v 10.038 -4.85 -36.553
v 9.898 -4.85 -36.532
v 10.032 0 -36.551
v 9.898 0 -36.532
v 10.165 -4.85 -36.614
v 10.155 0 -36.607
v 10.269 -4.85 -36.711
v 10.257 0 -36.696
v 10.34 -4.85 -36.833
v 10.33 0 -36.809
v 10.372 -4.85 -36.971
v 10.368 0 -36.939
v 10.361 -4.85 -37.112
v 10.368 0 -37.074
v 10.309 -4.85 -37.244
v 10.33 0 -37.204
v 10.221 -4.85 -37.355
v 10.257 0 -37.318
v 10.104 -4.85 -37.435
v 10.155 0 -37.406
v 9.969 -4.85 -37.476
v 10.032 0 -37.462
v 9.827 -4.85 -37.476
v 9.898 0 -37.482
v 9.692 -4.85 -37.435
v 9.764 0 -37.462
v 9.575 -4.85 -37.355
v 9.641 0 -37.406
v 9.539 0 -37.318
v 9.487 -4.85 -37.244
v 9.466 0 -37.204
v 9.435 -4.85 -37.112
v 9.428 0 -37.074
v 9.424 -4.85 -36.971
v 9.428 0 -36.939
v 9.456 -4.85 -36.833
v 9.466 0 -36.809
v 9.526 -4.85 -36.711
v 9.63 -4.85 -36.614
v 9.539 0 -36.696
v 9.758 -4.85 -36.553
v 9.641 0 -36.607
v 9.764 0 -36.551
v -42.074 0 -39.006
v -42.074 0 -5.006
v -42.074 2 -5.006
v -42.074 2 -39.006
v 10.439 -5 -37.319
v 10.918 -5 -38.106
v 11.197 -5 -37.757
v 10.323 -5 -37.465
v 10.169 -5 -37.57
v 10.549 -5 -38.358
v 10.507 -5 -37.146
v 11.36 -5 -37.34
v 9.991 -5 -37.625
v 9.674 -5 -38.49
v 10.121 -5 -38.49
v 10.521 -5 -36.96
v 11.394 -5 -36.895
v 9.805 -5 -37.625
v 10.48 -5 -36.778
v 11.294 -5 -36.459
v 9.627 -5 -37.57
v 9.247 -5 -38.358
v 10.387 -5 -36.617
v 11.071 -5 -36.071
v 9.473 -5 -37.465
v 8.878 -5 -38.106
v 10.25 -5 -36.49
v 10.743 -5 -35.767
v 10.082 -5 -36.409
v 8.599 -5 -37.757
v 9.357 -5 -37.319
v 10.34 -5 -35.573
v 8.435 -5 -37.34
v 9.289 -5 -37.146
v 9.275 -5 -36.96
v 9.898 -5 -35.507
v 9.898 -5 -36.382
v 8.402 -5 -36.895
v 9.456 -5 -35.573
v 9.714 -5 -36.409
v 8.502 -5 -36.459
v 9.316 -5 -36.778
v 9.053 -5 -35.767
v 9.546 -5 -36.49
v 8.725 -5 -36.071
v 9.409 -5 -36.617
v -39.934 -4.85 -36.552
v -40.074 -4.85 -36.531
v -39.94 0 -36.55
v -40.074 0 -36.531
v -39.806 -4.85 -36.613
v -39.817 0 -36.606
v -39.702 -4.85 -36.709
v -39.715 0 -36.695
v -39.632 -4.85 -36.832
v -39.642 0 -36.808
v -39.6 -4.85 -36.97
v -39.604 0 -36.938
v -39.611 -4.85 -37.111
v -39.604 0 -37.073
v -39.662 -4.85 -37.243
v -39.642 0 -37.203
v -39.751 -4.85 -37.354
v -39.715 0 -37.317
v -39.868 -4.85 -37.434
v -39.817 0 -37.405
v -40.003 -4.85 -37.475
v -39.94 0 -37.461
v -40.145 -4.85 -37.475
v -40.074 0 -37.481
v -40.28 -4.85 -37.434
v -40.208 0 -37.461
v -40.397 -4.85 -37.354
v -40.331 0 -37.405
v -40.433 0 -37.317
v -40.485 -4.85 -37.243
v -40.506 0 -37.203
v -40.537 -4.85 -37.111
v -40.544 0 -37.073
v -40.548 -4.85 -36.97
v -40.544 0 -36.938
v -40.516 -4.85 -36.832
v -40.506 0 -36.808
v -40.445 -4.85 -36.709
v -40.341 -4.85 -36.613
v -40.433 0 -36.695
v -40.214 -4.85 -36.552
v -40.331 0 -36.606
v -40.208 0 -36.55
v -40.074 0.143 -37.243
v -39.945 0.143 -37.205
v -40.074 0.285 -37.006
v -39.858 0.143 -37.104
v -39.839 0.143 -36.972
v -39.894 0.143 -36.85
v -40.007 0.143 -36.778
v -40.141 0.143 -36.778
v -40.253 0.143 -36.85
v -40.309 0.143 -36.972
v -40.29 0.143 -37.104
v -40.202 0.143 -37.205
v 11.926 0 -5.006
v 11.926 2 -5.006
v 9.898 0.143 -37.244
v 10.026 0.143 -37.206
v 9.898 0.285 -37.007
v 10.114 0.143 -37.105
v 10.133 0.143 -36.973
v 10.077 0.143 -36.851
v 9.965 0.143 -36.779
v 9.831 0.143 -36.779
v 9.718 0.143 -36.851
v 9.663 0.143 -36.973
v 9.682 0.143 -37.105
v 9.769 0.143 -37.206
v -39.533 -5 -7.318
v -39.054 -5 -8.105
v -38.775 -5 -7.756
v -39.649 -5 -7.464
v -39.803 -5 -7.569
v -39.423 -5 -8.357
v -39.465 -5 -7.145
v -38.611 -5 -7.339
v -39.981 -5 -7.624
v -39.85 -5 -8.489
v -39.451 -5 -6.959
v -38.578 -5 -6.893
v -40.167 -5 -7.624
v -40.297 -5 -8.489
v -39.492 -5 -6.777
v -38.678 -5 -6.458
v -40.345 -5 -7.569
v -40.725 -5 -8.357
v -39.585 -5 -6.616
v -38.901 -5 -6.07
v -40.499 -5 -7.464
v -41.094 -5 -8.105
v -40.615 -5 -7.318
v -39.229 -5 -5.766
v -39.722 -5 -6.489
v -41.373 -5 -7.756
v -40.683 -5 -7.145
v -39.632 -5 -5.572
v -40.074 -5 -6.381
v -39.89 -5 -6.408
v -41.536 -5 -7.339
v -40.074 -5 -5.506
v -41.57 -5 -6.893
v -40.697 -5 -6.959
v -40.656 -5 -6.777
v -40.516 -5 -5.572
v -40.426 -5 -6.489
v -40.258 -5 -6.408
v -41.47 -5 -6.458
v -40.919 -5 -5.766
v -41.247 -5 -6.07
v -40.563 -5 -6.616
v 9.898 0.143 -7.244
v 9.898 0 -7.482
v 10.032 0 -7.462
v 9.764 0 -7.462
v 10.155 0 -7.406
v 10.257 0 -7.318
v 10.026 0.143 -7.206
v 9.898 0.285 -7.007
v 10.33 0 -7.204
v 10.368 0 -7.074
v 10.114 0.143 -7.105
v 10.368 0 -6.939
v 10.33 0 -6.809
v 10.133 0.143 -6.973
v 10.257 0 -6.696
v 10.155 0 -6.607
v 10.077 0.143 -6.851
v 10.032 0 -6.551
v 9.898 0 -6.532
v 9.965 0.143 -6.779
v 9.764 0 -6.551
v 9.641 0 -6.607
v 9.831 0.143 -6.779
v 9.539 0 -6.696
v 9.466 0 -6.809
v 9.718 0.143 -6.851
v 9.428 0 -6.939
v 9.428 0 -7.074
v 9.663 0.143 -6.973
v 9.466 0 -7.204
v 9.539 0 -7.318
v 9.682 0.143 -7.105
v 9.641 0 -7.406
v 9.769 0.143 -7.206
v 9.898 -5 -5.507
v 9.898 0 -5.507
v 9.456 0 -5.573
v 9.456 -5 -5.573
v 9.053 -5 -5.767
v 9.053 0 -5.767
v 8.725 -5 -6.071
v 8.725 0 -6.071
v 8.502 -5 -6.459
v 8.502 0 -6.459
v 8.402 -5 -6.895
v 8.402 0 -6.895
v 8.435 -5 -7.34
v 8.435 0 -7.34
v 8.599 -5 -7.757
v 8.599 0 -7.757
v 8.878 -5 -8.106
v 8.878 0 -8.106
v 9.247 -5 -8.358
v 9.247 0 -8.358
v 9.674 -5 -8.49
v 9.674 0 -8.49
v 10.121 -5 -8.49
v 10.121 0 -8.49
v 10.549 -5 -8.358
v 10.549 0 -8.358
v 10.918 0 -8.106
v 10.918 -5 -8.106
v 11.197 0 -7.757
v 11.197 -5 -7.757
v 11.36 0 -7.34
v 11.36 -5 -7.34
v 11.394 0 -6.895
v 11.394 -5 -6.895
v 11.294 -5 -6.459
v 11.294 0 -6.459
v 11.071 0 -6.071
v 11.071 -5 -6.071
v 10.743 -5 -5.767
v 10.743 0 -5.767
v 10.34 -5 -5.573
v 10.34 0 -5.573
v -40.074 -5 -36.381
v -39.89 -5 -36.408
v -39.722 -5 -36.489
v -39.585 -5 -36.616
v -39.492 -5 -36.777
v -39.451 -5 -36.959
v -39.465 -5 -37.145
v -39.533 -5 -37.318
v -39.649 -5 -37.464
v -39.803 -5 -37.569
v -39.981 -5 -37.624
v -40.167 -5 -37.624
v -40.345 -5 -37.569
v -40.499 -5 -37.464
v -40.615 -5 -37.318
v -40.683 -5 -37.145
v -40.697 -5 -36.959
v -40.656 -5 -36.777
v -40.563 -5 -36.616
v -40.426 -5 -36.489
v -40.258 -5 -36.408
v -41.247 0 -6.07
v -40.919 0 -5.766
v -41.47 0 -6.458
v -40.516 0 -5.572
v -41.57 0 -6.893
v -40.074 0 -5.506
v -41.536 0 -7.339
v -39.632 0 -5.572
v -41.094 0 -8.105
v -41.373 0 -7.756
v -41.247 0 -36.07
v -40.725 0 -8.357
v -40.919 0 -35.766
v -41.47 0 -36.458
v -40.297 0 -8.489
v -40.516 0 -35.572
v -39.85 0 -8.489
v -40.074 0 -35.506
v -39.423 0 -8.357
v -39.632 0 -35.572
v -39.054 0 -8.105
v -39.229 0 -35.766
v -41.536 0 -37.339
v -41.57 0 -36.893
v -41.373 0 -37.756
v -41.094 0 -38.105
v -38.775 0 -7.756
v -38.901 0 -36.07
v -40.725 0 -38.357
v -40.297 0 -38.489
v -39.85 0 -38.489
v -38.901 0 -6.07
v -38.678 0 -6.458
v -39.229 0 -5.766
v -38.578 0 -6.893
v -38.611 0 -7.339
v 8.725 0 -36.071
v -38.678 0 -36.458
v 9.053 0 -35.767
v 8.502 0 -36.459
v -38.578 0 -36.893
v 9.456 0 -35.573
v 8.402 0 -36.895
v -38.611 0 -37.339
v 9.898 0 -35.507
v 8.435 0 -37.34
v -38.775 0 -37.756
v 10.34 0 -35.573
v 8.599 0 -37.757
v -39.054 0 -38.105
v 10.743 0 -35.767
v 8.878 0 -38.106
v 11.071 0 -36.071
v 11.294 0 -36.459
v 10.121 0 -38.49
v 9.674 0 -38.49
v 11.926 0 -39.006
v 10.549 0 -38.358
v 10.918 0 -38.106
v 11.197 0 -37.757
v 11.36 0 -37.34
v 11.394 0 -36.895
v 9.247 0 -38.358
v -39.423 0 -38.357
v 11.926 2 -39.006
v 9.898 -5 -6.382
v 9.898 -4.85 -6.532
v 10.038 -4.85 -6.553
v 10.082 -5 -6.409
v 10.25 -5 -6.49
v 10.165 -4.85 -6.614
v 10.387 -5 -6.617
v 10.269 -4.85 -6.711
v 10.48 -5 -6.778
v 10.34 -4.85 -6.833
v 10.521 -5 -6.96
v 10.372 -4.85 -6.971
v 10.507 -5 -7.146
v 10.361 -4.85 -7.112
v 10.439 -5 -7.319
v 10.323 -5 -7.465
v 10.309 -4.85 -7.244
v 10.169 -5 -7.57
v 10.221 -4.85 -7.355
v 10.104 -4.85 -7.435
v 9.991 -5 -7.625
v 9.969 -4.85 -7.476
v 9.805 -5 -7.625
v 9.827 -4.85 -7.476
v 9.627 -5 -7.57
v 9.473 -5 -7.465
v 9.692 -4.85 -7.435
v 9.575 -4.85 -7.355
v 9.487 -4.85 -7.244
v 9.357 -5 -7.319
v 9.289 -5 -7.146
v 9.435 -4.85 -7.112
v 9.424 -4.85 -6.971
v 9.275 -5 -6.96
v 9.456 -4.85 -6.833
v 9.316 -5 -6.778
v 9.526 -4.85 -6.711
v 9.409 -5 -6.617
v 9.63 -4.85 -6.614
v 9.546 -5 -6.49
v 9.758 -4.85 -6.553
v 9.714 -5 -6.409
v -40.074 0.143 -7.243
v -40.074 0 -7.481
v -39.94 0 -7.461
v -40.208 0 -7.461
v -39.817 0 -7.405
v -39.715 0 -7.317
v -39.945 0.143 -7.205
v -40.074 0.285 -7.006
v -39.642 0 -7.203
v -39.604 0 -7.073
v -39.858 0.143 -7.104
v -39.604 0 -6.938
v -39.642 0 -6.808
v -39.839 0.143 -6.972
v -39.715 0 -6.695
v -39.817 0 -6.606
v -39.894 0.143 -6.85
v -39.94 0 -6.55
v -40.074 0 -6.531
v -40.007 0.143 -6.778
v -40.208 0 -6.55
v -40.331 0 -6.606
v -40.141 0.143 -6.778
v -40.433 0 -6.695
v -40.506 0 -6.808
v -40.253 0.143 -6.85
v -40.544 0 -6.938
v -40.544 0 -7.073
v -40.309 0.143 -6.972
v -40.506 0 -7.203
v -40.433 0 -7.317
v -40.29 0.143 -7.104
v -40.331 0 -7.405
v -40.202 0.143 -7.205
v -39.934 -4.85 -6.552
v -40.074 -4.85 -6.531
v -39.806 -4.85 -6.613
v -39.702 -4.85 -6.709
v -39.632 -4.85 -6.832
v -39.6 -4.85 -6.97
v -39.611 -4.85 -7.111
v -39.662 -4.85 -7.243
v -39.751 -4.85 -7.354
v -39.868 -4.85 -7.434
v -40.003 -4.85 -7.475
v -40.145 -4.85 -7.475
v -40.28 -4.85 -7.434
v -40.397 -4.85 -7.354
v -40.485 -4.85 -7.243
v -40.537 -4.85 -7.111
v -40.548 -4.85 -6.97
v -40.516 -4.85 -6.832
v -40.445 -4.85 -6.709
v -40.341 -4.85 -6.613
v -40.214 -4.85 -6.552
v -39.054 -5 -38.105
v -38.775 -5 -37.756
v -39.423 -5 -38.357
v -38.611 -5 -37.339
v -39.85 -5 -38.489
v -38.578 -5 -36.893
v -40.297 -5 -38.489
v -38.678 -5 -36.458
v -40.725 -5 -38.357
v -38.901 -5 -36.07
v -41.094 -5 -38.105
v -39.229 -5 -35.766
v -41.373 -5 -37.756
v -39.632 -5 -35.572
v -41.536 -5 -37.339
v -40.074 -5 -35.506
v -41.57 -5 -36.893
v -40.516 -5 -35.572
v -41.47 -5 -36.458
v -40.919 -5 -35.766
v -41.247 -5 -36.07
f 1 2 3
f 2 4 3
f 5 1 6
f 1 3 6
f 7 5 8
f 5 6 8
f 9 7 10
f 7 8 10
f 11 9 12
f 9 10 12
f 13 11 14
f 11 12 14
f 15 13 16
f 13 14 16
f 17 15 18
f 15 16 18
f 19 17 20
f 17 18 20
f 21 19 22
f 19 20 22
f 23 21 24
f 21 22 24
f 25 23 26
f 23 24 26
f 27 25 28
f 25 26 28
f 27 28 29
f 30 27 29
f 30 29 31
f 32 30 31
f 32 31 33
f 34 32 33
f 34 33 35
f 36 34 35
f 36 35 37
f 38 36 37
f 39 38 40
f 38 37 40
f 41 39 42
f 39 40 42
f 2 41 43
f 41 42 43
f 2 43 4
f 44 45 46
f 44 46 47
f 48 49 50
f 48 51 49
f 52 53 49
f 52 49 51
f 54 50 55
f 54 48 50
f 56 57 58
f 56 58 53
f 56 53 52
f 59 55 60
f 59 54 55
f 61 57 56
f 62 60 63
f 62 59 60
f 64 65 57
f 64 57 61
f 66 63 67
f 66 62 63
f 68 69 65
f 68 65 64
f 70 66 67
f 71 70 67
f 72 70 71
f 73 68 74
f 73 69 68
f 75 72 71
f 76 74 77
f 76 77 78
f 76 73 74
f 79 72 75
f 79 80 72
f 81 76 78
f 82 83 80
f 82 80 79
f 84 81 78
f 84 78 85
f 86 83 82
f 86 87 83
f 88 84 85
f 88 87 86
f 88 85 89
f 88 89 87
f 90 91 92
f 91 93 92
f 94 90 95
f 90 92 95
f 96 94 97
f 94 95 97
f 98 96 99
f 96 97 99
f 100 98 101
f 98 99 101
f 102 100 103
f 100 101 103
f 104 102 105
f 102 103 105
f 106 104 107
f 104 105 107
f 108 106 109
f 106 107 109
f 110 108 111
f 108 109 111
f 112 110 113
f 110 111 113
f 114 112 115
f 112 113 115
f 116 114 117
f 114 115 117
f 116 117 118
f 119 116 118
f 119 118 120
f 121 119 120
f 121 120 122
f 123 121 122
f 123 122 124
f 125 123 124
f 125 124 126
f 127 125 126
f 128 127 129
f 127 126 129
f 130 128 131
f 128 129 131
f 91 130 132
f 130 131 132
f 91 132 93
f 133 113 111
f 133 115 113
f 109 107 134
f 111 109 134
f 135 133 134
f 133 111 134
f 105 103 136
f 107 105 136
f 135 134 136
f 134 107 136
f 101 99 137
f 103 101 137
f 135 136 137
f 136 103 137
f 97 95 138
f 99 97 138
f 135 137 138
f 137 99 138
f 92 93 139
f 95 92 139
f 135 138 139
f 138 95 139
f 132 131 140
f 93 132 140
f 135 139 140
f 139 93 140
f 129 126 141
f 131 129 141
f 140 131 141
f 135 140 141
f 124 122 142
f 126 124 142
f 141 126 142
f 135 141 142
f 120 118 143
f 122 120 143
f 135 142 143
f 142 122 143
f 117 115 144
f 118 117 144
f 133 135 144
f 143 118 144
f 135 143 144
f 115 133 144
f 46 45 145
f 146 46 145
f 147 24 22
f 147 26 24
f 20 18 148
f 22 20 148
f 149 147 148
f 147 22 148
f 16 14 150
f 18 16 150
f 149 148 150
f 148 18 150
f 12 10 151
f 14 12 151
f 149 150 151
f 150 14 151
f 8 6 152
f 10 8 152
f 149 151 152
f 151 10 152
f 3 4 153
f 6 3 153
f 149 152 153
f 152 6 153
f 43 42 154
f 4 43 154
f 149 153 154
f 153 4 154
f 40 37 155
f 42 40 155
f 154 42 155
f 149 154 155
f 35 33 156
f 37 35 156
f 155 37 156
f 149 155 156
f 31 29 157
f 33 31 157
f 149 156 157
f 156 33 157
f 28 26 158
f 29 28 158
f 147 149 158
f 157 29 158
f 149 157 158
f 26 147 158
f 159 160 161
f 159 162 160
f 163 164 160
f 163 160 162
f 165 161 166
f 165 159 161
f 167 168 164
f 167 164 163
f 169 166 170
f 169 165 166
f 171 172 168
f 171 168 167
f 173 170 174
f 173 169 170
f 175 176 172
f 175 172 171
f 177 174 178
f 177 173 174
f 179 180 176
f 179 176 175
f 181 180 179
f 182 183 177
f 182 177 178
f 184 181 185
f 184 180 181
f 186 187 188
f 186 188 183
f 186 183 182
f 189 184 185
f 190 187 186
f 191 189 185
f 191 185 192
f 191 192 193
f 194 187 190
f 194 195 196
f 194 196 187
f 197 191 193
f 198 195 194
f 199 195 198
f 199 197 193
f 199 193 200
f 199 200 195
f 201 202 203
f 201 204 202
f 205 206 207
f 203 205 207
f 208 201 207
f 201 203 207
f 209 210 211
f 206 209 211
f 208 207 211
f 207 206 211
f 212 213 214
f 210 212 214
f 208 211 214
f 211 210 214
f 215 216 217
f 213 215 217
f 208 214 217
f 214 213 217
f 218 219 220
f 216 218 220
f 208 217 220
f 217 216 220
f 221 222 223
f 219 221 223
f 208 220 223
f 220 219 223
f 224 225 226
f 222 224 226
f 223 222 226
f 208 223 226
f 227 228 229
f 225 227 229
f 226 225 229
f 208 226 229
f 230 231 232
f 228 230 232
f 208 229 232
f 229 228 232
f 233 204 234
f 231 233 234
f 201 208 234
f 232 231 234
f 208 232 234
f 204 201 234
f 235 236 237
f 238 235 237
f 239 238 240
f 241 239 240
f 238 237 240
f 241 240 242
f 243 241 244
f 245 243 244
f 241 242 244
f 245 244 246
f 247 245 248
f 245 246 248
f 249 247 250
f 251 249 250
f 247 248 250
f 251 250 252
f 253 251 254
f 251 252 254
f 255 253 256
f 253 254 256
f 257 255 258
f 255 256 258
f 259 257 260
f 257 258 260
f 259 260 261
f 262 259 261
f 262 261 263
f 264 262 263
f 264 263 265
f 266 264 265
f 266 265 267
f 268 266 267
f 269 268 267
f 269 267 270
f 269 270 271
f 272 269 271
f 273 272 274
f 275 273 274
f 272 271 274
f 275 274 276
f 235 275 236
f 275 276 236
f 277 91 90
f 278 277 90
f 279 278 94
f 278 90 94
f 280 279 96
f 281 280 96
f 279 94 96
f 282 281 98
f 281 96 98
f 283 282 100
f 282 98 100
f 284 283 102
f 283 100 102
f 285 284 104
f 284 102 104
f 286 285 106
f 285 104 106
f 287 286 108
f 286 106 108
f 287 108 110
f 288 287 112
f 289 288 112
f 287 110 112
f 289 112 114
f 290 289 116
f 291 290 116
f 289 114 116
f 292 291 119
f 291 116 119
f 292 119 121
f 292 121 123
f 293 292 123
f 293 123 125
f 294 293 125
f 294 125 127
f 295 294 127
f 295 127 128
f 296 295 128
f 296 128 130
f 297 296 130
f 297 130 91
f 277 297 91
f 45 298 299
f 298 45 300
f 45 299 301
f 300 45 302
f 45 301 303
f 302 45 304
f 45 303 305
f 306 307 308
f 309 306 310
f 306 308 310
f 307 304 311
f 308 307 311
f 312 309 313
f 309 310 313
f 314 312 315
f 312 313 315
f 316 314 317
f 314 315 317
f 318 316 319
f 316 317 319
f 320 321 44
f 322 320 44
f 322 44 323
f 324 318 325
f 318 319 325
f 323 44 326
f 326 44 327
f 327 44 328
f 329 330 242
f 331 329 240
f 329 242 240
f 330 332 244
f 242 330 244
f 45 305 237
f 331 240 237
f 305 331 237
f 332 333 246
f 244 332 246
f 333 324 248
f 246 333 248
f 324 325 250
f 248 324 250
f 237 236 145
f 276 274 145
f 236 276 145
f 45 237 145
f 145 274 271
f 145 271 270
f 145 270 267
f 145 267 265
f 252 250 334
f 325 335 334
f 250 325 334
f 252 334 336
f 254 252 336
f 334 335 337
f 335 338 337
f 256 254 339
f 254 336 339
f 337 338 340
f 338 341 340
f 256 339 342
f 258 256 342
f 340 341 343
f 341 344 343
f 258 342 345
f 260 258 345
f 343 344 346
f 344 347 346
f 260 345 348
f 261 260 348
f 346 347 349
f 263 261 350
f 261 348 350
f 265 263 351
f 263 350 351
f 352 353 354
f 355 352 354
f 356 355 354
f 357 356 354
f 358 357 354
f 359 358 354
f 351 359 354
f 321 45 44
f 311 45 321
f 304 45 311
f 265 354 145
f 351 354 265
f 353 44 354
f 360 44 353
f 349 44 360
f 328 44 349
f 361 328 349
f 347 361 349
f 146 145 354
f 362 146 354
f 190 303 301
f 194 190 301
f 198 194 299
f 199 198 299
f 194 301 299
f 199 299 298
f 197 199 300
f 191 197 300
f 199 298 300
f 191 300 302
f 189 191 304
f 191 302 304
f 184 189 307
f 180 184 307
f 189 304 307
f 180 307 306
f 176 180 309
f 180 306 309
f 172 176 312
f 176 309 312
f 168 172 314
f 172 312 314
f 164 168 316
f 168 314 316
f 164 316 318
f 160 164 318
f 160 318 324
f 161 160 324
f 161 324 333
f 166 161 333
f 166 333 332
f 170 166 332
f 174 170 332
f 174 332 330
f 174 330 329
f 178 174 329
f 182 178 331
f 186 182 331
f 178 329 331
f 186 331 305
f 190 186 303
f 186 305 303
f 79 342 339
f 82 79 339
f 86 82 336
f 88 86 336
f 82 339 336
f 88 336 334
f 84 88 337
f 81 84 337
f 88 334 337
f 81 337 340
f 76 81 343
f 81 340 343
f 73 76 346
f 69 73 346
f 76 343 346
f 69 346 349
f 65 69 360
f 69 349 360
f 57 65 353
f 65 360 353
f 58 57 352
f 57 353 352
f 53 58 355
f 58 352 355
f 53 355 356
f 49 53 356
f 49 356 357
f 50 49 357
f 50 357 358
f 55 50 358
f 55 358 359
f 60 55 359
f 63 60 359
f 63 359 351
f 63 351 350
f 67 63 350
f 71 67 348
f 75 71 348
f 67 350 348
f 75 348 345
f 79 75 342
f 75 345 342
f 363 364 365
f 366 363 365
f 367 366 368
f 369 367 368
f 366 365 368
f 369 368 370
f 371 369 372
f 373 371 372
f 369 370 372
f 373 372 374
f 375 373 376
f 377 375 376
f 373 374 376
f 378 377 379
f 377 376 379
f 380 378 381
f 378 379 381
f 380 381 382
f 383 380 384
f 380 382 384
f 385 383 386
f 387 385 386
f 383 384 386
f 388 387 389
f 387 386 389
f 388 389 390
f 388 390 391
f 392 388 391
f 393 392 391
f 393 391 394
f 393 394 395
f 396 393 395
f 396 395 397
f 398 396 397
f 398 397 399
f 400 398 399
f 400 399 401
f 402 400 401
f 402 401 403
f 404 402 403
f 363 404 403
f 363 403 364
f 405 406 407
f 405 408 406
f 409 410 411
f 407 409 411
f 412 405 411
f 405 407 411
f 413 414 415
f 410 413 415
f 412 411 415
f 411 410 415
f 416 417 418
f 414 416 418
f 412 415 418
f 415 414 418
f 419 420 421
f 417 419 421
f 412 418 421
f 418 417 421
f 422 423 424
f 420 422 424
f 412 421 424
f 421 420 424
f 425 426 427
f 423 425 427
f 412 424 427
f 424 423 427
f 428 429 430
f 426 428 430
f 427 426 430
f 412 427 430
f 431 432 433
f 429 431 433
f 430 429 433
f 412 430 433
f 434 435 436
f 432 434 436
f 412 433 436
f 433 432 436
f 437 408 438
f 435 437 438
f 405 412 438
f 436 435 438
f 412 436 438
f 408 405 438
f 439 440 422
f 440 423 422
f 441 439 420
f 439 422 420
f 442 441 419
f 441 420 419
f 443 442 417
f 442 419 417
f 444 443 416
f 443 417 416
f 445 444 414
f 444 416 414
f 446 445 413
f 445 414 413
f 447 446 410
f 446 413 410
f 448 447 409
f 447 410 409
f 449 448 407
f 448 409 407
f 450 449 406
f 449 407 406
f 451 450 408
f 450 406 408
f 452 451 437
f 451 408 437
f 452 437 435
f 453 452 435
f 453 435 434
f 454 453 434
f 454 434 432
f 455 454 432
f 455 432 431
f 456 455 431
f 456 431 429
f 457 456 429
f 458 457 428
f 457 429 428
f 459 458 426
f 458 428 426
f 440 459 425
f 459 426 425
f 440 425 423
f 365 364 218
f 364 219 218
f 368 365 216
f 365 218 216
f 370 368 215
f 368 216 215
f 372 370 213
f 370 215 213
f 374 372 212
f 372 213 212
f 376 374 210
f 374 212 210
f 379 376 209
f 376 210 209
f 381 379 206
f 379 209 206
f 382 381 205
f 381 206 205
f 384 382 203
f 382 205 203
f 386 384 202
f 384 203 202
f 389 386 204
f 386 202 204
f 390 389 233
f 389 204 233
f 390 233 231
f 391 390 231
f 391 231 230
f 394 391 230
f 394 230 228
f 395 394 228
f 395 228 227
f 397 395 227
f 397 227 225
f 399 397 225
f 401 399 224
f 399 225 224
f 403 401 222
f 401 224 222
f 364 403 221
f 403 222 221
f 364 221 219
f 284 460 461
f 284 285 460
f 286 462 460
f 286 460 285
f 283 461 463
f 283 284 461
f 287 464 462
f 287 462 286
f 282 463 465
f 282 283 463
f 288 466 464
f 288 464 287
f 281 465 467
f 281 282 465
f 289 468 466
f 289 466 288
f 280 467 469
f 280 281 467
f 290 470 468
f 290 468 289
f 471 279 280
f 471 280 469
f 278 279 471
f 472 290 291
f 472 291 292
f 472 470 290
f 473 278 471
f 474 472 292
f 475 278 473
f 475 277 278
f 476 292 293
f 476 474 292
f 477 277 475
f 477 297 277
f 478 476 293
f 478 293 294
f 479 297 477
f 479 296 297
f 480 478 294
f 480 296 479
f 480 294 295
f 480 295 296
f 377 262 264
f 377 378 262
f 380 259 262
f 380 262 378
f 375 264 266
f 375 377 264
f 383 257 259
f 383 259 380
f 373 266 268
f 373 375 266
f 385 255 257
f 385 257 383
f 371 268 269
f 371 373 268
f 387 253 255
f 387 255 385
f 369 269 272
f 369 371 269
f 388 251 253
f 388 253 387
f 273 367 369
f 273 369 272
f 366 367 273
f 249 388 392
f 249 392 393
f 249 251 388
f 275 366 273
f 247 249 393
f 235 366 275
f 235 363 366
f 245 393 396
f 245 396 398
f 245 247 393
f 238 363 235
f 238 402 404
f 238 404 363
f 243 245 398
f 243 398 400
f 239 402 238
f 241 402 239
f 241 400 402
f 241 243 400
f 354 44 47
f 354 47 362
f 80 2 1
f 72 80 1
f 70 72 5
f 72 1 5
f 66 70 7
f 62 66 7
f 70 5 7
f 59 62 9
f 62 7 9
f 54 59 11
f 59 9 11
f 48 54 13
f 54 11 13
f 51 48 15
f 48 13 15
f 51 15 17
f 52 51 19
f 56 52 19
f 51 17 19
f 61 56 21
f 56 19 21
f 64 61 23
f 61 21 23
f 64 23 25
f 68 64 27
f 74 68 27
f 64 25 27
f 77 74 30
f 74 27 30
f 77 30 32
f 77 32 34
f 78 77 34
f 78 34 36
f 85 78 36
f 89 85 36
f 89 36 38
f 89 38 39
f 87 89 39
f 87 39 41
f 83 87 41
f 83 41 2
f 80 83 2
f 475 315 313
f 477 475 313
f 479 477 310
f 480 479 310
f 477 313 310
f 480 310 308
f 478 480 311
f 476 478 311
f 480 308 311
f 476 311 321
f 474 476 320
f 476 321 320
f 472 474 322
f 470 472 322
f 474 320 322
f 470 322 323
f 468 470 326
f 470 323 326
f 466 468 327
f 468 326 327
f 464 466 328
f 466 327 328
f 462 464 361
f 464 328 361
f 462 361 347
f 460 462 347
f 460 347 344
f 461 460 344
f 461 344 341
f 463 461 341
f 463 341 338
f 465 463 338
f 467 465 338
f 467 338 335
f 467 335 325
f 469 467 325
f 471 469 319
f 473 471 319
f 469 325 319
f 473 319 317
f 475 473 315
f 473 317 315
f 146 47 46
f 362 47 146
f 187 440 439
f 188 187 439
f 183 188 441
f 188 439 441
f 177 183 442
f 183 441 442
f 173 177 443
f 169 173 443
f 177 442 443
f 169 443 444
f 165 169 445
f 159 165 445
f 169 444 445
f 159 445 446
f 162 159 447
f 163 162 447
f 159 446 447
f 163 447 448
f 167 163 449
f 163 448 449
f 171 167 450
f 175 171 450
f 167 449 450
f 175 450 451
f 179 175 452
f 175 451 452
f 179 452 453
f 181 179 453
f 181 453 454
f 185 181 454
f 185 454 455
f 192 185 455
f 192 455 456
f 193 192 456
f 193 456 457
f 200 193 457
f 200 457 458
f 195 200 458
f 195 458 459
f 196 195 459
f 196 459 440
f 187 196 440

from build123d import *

# Parameters (mm, degrees)
SKETCH1_W                          = 54
SKETCH1_H                          = 34
BOSS_EXTRUDE1_DEPTH                = 2
SKETCH4_R                          = 1.5
BOSS_EXTRUDE2_DEPTH                = 5
M1_2X0_25_TAPPED_HOLE1_D           = 0.95
M1_2X0_25_TAPPED_HOLE1_DEPTH       = 5
M1_2X0_25_TAPPED_HOLE1_CSINK_D     = 1.25
M1_2X0_25_TAPPED_HOLE1_CSINK_ANGLE = 90
M1_2X0_25_TAPPED_HOLE1_TIP         = 0.285408794


with BuildPart() as part:
    # Sketch1 → Boss-Extrude1 (new body)
    with BuildSketch(Plane(origin=(0, 0, 0), x_dir=(1, 0, 0), z_dir=(0, 1, 0))):
        with Locations((-15.073860766, 22.005565176)):
            Rectangle(SKETCH1_W, SKETCH1_H)
    extrude(amount=BOSS_EXTRUDE1_DEPTH)

    # Sketch4 → Boss-Extrude2 (add)
    with BuildSketch(Plane.XZ):
        with Locations(Location((-40.073860766, -7.005565176, 0), (0, 0, 90))):
            Circle(SKETCH4_R)
        with Locations(Location((9.897863343, -7.006700775, 0), (0, 0, 90))):
            Circle(SKETCH4_R)
        with Locations(Location((9.897863343, -37.006700775, 0), (0, 0, 90))):
            Circle(SKETCH4_R)
        with Locations(Location((-40.073860766, -37.005565176, 0), (0, 0, 90))):
            Circle(SKETCH4_R)
    extrude(amount=BOSS_EXTRUDE2_DEPTH)

    # M1.2x0.25 Tapped Hole1
    with Locations(Plane(origin=(-40.073860766, -5, -7.005565176), x_dir=(0, 0, -1), z_dir=(0, -1, 0))):
        with Locations((0, 0), (30, 0), (0.001135599, 49.971724109), (30.001135599, 49.971724109)):
            CounterSinkHole(M1_2X0_25_TAPPED_HOLE1_D / 2, M1_2X0_25_TAPPED_HOLE1_CSINK_D / 2, depth=M1_2X0_25_TAPPED_HOLE1_DEPTH, counter_sink_angle=M1_2X0_25_TAPPED_HOLE1_CSINK_ANGLE)
            with Locations((0, 0, -(M1_2X0_25_TAPPED_HOLE1_DEPTH + M1_2X0_25_TAPPED_HOLE1_TIP / 2))):  # 118° drill point
                Cone(0, M1_2X0_25_TAPPED_HOLE1_D / 2, M1_2X0_25_TAPPED_HOLE1_TIP, mode=Mode.SUBTRACT)


solid = part.part
